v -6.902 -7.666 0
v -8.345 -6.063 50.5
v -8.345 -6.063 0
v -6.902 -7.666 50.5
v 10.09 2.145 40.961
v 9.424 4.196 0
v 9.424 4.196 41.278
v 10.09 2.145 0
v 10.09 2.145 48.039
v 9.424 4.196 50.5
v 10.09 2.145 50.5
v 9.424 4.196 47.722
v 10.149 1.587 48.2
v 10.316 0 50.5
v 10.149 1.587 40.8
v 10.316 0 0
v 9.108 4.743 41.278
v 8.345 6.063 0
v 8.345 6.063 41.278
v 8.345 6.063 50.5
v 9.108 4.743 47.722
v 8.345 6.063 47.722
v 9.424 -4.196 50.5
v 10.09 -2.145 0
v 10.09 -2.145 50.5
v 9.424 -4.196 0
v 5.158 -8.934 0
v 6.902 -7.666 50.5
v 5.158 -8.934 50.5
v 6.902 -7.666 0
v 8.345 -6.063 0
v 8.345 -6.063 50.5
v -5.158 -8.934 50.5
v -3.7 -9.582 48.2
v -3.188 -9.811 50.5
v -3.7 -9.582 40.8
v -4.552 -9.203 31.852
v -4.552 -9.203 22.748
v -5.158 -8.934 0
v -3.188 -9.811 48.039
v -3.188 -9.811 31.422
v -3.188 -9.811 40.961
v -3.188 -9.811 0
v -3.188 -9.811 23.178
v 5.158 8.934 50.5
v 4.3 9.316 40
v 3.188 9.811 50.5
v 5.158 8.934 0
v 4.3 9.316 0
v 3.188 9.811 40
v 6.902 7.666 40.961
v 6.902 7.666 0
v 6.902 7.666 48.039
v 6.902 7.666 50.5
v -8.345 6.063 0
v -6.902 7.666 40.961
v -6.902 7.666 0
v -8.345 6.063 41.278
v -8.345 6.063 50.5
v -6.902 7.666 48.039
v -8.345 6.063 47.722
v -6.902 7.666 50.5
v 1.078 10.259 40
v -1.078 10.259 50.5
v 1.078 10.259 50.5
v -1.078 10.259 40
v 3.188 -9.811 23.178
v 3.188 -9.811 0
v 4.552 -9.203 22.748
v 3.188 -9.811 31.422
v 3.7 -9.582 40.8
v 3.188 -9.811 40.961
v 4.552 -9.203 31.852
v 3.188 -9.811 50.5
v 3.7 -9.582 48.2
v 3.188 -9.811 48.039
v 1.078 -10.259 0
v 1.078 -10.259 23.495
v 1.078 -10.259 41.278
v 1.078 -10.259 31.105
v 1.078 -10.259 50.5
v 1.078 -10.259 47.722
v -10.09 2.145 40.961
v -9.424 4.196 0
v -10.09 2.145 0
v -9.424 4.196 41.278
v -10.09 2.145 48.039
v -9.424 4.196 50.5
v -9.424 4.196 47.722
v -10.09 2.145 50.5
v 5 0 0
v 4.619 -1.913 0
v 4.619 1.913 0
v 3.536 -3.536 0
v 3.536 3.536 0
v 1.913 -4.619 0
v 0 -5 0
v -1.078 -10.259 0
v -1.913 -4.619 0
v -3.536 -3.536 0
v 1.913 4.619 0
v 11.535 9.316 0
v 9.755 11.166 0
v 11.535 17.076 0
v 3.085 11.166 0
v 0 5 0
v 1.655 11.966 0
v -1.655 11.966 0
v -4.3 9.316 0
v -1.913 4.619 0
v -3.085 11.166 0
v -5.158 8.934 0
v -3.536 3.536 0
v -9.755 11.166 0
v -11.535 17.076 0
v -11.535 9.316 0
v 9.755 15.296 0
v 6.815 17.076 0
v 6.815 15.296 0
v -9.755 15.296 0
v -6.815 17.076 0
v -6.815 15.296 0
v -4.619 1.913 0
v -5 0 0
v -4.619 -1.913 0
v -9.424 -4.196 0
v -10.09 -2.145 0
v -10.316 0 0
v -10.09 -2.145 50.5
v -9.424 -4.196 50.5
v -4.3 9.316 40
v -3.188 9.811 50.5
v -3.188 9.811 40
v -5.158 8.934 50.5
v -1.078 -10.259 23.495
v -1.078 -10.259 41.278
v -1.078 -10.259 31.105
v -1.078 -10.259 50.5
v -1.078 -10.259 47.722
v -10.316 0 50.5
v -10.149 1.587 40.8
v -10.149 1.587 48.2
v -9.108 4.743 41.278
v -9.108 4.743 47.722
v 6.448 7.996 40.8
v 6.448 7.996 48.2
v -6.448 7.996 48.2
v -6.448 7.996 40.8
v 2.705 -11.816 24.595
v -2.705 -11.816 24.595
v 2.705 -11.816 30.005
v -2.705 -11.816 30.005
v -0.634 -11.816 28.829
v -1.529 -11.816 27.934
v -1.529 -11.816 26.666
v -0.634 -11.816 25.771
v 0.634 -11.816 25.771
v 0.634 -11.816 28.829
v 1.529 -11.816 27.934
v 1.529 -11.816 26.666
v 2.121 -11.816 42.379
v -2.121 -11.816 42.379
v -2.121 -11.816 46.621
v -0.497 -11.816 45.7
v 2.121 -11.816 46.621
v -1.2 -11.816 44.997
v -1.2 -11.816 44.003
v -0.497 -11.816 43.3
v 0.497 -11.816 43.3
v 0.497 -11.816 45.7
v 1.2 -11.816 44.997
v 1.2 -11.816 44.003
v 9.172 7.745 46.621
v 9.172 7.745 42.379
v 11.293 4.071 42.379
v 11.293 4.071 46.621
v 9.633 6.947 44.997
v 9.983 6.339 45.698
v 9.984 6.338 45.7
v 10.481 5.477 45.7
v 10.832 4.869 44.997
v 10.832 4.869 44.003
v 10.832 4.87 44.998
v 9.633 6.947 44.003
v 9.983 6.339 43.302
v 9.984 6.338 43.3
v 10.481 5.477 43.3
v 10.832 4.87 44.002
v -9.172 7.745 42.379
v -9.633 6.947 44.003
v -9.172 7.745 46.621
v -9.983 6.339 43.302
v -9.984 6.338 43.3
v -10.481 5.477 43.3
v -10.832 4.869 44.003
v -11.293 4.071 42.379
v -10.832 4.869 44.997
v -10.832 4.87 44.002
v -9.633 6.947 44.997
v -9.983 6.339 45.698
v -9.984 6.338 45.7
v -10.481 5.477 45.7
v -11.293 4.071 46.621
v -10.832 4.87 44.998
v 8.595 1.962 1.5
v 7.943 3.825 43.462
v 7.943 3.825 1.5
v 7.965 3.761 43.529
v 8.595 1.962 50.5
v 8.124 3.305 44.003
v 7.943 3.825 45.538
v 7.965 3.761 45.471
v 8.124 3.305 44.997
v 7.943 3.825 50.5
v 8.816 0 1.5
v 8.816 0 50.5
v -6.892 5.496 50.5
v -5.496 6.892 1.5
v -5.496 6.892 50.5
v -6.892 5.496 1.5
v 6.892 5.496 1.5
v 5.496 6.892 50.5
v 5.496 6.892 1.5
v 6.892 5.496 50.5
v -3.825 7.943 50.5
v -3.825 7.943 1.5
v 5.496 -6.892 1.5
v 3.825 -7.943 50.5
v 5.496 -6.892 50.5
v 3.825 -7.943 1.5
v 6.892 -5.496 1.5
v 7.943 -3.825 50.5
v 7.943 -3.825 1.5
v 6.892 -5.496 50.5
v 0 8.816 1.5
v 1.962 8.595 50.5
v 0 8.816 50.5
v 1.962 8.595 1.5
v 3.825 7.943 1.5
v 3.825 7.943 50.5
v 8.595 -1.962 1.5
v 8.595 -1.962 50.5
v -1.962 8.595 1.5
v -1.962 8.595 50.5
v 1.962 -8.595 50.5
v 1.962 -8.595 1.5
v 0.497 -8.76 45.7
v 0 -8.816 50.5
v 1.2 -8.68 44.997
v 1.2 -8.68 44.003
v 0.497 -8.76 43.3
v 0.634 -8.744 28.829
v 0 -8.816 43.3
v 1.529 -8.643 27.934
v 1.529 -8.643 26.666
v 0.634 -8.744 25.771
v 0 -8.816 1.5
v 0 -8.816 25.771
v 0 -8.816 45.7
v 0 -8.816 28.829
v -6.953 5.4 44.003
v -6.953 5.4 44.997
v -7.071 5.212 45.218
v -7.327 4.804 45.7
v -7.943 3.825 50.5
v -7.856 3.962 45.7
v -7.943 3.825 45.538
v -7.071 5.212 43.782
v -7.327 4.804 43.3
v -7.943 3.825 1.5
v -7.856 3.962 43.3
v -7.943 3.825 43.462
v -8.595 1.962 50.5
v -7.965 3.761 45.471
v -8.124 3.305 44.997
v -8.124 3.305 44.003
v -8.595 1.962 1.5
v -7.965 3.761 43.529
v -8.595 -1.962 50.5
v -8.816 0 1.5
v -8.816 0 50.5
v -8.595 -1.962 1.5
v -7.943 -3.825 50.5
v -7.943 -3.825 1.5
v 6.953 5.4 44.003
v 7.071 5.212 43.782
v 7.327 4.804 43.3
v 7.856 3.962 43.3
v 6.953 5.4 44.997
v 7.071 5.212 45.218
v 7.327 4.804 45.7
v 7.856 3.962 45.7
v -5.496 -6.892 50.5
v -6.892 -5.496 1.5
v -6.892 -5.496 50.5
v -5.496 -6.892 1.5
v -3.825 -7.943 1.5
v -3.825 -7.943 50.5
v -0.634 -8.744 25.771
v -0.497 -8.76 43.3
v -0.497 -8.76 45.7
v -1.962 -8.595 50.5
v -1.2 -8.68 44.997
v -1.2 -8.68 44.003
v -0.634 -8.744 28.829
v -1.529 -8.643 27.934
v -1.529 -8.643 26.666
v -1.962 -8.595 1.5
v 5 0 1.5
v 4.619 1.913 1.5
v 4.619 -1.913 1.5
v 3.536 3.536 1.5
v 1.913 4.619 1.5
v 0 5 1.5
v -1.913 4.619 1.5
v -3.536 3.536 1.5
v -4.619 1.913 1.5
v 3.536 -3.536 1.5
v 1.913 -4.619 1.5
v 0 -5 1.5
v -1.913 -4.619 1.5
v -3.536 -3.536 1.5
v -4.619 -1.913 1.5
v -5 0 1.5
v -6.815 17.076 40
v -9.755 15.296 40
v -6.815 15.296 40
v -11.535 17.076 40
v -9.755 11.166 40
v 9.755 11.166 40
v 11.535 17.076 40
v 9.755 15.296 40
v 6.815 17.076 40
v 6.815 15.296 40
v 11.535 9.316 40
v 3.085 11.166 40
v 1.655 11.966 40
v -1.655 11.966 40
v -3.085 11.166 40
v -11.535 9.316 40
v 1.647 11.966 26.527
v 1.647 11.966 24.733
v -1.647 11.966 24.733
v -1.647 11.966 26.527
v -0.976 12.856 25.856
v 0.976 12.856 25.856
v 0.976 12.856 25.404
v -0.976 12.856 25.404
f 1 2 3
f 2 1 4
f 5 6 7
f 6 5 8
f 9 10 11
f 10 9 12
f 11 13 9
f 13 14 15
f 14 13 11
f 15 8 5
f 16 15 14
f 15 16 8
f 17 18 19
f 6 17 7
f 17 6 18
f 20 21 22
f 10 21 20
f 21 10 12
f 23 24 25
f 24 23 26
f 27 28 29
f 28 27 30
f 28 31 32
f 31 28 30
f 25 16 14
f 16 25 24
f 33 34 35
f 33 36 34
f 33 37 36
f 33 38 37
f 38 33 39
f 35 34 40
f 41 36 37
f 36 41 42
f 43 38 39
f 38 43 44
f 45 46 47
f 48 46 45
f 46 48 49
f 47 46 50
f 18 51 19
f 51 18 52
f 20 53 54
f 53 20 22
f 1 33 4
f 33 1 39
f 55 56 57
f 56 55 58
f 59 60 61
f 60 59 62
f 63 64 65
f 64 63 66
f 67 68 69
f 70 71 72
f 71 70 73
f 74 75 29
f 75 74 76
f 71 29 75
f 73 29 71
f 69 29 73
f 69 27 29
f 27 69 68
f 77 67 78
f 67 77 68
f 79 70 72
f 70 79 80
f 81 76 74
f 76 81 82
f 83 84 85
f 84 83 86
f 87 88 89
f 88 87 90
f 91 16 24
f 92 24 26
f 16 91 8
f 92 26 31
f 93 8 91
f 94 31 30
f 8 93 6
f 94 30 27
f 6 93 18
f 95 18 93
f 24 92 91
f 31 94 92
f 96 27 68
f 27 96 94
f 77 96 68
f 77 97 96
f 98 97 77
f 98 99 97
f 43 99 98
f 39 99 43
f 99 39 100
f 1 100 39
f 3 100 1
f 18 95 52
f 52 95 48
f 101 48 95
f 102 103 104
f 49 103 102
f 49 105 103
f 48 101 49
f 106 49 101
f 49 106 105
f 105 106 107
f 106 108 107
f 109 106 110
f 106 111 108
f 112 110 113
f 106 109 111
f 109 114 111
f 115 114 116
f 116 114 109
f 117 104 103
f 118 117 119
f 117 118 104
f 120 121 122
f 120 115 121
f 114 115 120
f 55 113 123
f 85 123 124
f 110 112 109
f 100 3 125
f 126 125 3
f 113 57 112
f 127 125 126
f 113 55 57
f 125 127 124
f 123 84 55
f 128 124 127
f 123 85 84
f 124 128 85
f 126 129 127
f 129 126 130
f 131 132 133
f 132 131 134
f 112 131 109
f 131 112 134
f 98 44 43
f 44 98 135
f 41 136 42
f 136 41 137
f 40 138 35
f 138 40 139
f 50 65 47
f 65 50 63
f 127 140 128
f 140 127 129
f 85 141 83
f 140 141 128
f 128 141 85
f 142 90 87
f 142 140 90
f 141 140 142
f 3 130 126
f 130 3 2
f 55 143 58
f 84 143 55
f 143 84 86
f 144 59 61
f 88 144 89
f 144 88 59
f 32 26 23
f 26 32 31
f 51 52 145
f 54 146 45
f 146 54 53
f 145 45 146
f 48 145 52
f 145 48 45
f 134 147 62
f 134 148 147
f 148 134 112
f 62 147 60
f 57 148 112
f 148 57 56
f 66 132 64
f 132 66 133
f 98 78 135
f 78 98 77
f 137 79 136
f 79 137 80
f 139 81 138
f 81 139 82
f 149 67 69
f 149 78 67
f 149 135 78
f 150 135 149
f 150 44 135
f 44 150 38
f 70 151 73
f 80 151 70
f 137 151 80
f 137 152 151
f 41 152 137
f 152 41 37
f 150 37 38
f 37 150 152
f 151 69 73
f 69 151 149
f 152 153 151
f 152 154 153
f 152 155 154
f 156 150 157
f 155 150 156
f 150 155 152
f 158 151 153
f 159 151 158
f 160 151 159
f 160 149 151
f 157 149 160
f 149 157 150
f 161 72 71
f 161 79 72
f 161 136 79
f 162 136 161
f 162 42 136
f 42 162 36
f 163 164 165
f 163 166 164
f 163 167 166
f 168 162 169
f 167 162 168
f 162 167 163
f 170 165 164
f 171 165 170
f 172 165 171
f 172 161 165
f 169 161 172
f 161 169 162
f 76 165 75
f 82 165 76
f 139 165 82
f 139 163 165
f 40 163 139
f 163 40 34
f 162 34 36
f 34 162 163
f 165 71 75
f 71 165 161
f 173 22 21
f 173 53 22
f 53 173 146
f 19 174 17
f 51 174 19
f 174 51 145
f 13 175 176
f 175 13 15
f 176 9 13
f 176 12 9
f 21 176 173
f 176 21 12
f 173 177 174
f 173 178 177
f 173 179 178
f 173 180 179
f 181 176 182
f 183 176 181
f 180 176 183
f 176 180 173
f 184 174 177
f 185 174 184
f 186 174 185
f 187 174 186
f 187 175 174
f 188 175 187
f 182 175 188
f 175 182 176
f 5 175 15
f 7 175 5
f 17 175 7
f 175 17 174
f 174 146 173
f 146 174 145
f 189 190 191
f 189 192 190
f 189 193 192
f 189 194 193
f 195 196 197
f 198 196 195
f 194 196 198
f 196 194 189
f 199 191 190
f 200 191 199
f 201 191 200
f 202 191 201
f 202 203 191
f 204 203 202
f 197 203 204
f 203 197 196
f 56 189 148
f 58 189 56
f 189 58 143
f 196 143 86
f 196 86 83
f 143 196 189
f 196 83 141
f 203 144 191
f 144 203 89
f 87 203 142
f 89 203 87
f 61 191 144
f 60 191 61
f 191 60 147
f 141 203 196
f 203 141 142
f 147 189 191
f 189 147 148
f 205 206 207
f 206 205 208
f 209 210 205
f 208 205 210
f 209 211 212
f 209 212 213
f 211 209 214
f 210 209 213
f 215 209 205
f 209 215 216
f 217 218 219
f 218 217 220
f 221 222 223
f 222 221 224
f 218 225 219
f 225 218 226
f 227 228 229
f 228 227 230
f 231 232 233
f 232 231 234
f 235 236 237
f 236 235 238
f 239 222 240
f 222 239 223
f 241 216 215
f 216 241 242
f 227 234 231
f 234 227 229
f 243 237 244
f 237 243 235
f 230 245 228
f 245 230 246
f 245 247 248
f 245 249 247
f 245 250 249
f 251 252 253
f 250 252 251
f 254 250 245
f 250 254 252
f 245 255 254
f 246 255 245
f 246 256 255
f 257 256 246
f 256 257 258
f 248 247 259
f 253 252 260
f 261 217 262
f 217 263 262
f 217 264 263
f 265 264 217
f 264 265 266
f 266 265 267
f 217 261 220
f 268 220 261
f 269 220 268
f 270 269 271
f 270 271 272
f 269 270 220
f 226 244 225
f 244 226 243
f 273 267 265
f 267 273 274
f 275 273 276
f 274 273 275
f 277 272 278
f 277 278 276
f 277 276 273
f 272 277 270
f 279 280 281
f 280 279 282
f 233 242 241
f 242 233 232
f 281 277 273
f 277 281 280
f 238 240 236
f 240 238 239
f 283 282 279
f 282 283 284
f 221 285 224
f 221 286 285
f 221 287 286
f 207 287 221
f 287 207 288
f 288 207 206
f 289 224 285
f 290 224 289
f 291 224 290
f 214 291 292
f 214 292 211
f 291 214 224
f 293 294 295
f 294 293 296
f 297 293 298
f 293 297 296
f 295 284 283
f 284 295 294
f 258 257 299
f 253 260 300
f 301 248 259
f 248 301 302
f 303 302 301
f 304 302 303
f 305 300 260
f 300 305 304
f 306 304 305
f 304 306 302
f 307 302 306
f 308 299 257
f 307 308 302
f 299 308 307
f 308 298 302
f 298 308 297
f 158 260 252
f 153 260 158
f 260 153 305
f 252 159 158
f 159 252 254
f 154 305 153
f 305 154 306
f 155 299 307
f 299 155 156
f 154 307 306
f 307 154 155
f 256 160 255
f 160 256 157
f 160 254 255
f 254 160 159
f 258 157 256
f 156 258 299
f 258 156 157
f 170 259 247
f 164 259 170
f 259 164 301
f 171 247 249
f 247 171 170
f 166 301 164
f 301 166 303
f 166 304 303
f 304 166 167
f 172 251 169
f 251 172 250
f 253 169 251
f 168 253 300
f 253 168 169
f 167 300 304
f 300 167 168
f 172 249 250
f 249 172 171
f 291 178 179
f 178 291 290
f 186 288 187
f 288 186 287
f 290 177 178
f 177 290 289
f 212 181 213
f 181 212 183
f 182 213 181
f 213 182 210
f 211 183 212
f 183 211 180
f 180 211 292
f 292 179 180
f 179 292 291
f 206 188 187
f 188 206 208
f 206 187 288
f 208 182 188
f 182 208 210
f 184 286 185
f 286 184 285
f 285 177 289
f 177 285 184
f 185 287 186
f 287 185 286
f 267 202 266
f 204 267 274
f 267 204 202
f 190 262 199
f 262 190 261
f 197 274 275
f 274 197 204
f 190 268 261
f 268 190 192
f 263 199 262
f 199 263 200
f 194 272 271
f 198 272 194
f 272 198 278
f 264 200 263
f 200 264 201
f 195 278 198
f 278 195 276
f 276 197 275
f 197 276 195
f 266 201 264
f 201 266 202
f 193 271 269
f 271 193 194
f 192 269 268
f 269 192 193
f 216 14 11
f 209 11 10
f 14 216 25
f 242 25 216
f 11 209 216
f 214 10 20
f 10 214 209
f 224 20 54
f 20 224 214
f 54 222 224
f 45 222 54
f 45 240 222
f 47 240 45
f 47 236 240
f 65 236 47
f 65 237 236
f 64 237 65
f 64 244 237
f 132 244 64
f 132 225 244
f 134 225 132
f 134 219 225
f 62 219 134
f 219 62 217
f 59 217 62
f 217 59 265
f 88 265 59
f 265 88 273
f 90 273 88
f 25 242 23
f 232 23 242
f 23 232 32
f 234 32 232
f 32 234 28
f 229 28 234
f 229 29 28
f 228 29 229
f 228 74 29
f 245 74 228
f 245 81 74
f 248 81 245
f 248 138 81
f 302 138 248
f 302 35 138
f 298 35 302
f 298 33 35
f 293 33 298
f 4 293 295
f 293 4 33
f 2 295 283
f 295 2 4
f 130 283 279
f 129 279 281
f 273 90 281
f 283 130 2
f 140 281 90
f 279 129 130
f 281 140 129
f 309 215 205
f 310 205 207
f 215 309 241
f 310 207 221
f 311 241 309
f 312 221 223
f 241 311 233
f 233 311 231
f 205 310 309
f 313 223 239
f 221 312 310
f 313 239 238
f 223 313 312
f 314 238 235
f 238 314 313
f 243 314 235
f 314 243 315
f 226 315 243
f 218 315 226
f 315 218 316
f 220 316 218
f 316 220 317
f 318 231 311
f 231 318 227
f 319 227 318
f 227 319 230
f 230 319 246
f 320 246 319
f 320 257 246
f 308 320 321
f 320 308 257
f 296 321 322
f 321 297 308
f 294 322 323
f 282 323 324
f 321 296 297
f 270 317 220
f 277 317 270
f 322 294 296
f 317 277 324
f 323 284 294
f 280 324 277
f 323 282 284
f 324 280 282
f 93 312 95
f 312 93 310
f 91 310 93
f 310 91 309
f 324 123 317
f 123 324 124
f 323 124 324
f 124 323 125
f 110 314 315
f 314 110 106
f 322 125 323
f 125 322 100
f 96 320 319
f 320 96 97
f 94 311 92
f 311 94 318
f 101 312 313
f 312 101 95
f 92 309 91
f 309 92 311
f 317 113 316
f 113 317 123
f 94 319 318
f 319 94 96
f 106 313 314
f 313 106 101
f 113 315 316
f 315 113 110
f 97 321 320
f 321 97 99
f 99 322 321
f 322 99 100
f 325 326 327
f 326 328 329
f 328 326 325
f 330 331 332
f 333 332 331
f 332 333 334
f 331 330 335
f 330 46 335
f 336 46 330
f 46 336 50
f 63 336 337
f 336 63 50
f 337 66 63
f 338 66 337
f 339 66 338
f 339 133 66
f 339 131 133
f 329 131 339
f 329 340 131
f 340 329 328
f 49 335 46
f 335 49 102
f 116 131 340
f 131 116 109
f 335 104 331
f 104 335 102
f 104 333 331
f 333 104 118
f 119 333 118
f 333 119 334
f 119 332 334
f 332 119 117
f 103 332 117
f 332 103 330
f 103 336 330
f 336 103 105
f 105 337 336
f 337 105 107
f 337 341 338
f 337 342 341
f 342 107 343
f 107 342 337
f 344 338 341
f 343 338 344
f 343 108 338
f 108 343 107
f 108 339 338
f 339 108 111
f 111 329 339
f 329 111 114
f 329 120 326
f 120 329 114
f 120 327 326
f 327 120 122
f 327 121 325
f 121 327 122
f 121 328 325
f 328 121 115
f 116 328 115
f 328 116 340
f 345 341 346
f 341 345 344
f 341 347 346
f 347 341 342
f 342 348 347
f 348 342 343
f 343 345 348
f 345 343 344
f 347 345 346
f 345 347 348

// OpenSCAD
railTolerance = 0.63;

laserDiameter = 10;
wallThickness = 1.5;
lowerLipThickness = 1.5;
laserButtonStickout = 1.85; // distance button sticks out of tube
laserButtonDistanceFromBottomOfLaser = 29.3;
laserButtonScrewDiameter = 3.06; 
backStickout = 2; // how far laser will stick out of tube

clipLength = 30; 
clipWallThickness = 1;
blowgunDiameter = 15.9;

adjustmentRatio = 0.072;
adjustmentScrewDistance = 44.5;
adjustmentScrewDiameter = 2.4; 

laserButtonDistance = laserButtonDistanceFromBottomOfLaser - backStickout;
totalLength = adjustmentScrewDistance + 6;

tubeInnerRadius = laserDiameter/2 + laserButtonStickout + laserButtonDistance * adjustmentRatio;


nudge = 0.01;

module screw(height, angle, diameter, positive) {
    translate([0,0,height]) rotate([90,0,angle]) translate([0,0,tubeInnerRadius-wallThickness])
    if(positive) {
        rotate([0,0,45])
        cylinder(d2=diameter*2.5,d1=diameter*2.5+6*wallThickness,h=3*wallThickness,$fn=4);
    }
    else {
        rotate([0,0,22.5])
        translate([0,0,-nudge]) cylinder(d=diameter*1.082,h=3*wallThickness+2*nudge,$fn=8);
    }
}

module tube() {
    render(convexity=8)
    difference() {
        union() {
            cylinder(h=totalLength+nudge, r=tubeInnerRadius+wallThickness);
            screw(laserButtonDistance, 0, laserButtonScrewDiameter,true);
            screw(adjustmentScrewDistance, 0, adjustmentScrewDiameter,true);
            screw(adjustmentScrewDistance, 120, adjustmentScrewDiameter,true);
            screw(adjustmentScrewDistance, -120, adjustmentScrewDiameter,true);
        }
        translate([0,0,-nudge]) cylinder(h=totalLength+2*nudge, r=tubeInnerRadius);
            screw(laserButtonDistance, 0, laserButtonScrewDiameter,false);
            screw(adjustmentScrewDistance, 0, adjustmentScrewDiameter,false);
            screw(adjustmentScrewDistance, 120, adjustmentScrewDiameter,false);
            screw(adjustmentScrewDistance, -120, adjustmentScrewDiameter,false);
            translate([0,0,totalLength]) cylinder(h=30, r=tubeInnerRadius+wallThickness);
    } 

    render(convexity=8)
    difference() {
        cylinder(h=lowerLipThickness, r=tubeInnerRadius+nudge);
        translate([0,0,-nudge]) cylinder(h=lowerLipThickness+2*nudge, d=laserDiameter);
    }
}

module clip() {
    render(convexity=5)
    translate([0,blowgunDiameter/2+clipWallThickness,0])
    difference() {
                cylinder(h=clipLength,d=blowgunDiameter+2*clipWallThickness);
        translate([0,blowgunDiameter*.85,clipLength]) rotate([-45,0,0])
        cube(center=true,blowgunDiameter+2*clipWallThickness);
translate([0,0,clipLength-clipWallThickness+nudge]) cylinder(h=clipWallThickness,d1=blowgunDiameter,d2=blowgunDiameter+2*clipWallThickness);
        translate([0,0,-nudge]) {
            cylinder(h=clipLength+2*nudge,d=blowgunDiameter);
            translate([0,1.5*(clipWallThickness+blowgunDiameter/2),0]) linear_extrude(height=clipLength+2*nudge) square(center=true, blowgunDiameter+2*clipWallThickness+2*nudge);
        }
    }
}


module nerfRail(positive=false,length=40,tolerance=0.25) {
    outerWidth = 18.25;
    outerThickness = 2.87;
    valleyDepth = 1.43;
    shoulderWidth = 5.41;
    nubDistanceFromFront = 15;
    nubSize=1.81;
    nubThickness=.9;
    overhang = 2.94;
    outerDepth = 3.56;
    nudge = 0.01;
        
    // positive tolerance makes it larger
    module positiveRailProfile(tolerance=0) {
    points=[[-outerWidth/2-tolerance+overhang,0],
        [-outerWidth/2-tolerance+overhang,outerDepth-tolerance],
        [-outerWidth/2-tolerance,outerDepth-tolerance],
        [-outerWidth/2-tolerance,outerDepth+outerThickness+tolerance],
        [-outerWidth/2+shoulderWidth+tolerance,outerDepth+outerThickness+tolerance],
        [-outerWidth/2+shoulderWidth+tolerance+valleyDepth,
        outerDepth+outerThickness+tolerance-valleyDepth+tolerance],
        [nudge,
        outerDepth+outerThickness+tolerance-valleyDepth+tolerance],
        [nudge,0]    
        ];

        union() {
            polygon(points=points);
            scale([-1,1,1]) polygon(points=points);
        }
    }

    module negativeRailProfile(tolerance=0.25) {
        translate([0,-outerDepth/2+tolerance])
        render(convexity=3) difference() {
            translate([-tolerance-outerWidth/2-outerDepth/2,outerDepth/2-tolerance]) square([outerWidth+outerDepth+2*tolerance,overhang+outerDepth+2*tolerance]);
            positiveRailProfile(tolerance=tolerance);
        }
        
        
    }
    
    module nub() {
        hull() {
        translate([-outerWidth/2+shoulderWidth+tolerance+valleyDepth+nubSize/2,0,0])
        rotate([90,0,0])
        linear_extrude(height=nubThickness,scale=0.25)
        square(nubSize,center=true);
        translate(-[-outerWidth/2+shoulderWidth+tolerance+valleyDepth+nubSize/2,0,0])
        rotate([90,0,0])
        linear_extrude(height=nubThickness,scale=0.25)
        square(nubSize,center=true);
        }
    }
        
    if (positive) {
        linear_extrude(height=length)
        positiveRailProfile(tolerance=-tolerance);
    }
    else {
        translate(-[0,overhang+outerDepth+2*tolerance,0]) {
        linear_extrude(height=length)
        negativeRailProfile(tolerance=tolerance);
        translate([0,(outerDepth+outerThickness+3*tolerance-valleyDepth)-outerDepth/2+nudge,length-nubDistanceFromFront+tolerance])
        nub();
        }
    }
  
}


tube();
translate([0,tubeInnerRadius+wallThickness-clipWallThickness,0])
rotate([0,0,180])
nerfRail(tolerance=railTolerance);
